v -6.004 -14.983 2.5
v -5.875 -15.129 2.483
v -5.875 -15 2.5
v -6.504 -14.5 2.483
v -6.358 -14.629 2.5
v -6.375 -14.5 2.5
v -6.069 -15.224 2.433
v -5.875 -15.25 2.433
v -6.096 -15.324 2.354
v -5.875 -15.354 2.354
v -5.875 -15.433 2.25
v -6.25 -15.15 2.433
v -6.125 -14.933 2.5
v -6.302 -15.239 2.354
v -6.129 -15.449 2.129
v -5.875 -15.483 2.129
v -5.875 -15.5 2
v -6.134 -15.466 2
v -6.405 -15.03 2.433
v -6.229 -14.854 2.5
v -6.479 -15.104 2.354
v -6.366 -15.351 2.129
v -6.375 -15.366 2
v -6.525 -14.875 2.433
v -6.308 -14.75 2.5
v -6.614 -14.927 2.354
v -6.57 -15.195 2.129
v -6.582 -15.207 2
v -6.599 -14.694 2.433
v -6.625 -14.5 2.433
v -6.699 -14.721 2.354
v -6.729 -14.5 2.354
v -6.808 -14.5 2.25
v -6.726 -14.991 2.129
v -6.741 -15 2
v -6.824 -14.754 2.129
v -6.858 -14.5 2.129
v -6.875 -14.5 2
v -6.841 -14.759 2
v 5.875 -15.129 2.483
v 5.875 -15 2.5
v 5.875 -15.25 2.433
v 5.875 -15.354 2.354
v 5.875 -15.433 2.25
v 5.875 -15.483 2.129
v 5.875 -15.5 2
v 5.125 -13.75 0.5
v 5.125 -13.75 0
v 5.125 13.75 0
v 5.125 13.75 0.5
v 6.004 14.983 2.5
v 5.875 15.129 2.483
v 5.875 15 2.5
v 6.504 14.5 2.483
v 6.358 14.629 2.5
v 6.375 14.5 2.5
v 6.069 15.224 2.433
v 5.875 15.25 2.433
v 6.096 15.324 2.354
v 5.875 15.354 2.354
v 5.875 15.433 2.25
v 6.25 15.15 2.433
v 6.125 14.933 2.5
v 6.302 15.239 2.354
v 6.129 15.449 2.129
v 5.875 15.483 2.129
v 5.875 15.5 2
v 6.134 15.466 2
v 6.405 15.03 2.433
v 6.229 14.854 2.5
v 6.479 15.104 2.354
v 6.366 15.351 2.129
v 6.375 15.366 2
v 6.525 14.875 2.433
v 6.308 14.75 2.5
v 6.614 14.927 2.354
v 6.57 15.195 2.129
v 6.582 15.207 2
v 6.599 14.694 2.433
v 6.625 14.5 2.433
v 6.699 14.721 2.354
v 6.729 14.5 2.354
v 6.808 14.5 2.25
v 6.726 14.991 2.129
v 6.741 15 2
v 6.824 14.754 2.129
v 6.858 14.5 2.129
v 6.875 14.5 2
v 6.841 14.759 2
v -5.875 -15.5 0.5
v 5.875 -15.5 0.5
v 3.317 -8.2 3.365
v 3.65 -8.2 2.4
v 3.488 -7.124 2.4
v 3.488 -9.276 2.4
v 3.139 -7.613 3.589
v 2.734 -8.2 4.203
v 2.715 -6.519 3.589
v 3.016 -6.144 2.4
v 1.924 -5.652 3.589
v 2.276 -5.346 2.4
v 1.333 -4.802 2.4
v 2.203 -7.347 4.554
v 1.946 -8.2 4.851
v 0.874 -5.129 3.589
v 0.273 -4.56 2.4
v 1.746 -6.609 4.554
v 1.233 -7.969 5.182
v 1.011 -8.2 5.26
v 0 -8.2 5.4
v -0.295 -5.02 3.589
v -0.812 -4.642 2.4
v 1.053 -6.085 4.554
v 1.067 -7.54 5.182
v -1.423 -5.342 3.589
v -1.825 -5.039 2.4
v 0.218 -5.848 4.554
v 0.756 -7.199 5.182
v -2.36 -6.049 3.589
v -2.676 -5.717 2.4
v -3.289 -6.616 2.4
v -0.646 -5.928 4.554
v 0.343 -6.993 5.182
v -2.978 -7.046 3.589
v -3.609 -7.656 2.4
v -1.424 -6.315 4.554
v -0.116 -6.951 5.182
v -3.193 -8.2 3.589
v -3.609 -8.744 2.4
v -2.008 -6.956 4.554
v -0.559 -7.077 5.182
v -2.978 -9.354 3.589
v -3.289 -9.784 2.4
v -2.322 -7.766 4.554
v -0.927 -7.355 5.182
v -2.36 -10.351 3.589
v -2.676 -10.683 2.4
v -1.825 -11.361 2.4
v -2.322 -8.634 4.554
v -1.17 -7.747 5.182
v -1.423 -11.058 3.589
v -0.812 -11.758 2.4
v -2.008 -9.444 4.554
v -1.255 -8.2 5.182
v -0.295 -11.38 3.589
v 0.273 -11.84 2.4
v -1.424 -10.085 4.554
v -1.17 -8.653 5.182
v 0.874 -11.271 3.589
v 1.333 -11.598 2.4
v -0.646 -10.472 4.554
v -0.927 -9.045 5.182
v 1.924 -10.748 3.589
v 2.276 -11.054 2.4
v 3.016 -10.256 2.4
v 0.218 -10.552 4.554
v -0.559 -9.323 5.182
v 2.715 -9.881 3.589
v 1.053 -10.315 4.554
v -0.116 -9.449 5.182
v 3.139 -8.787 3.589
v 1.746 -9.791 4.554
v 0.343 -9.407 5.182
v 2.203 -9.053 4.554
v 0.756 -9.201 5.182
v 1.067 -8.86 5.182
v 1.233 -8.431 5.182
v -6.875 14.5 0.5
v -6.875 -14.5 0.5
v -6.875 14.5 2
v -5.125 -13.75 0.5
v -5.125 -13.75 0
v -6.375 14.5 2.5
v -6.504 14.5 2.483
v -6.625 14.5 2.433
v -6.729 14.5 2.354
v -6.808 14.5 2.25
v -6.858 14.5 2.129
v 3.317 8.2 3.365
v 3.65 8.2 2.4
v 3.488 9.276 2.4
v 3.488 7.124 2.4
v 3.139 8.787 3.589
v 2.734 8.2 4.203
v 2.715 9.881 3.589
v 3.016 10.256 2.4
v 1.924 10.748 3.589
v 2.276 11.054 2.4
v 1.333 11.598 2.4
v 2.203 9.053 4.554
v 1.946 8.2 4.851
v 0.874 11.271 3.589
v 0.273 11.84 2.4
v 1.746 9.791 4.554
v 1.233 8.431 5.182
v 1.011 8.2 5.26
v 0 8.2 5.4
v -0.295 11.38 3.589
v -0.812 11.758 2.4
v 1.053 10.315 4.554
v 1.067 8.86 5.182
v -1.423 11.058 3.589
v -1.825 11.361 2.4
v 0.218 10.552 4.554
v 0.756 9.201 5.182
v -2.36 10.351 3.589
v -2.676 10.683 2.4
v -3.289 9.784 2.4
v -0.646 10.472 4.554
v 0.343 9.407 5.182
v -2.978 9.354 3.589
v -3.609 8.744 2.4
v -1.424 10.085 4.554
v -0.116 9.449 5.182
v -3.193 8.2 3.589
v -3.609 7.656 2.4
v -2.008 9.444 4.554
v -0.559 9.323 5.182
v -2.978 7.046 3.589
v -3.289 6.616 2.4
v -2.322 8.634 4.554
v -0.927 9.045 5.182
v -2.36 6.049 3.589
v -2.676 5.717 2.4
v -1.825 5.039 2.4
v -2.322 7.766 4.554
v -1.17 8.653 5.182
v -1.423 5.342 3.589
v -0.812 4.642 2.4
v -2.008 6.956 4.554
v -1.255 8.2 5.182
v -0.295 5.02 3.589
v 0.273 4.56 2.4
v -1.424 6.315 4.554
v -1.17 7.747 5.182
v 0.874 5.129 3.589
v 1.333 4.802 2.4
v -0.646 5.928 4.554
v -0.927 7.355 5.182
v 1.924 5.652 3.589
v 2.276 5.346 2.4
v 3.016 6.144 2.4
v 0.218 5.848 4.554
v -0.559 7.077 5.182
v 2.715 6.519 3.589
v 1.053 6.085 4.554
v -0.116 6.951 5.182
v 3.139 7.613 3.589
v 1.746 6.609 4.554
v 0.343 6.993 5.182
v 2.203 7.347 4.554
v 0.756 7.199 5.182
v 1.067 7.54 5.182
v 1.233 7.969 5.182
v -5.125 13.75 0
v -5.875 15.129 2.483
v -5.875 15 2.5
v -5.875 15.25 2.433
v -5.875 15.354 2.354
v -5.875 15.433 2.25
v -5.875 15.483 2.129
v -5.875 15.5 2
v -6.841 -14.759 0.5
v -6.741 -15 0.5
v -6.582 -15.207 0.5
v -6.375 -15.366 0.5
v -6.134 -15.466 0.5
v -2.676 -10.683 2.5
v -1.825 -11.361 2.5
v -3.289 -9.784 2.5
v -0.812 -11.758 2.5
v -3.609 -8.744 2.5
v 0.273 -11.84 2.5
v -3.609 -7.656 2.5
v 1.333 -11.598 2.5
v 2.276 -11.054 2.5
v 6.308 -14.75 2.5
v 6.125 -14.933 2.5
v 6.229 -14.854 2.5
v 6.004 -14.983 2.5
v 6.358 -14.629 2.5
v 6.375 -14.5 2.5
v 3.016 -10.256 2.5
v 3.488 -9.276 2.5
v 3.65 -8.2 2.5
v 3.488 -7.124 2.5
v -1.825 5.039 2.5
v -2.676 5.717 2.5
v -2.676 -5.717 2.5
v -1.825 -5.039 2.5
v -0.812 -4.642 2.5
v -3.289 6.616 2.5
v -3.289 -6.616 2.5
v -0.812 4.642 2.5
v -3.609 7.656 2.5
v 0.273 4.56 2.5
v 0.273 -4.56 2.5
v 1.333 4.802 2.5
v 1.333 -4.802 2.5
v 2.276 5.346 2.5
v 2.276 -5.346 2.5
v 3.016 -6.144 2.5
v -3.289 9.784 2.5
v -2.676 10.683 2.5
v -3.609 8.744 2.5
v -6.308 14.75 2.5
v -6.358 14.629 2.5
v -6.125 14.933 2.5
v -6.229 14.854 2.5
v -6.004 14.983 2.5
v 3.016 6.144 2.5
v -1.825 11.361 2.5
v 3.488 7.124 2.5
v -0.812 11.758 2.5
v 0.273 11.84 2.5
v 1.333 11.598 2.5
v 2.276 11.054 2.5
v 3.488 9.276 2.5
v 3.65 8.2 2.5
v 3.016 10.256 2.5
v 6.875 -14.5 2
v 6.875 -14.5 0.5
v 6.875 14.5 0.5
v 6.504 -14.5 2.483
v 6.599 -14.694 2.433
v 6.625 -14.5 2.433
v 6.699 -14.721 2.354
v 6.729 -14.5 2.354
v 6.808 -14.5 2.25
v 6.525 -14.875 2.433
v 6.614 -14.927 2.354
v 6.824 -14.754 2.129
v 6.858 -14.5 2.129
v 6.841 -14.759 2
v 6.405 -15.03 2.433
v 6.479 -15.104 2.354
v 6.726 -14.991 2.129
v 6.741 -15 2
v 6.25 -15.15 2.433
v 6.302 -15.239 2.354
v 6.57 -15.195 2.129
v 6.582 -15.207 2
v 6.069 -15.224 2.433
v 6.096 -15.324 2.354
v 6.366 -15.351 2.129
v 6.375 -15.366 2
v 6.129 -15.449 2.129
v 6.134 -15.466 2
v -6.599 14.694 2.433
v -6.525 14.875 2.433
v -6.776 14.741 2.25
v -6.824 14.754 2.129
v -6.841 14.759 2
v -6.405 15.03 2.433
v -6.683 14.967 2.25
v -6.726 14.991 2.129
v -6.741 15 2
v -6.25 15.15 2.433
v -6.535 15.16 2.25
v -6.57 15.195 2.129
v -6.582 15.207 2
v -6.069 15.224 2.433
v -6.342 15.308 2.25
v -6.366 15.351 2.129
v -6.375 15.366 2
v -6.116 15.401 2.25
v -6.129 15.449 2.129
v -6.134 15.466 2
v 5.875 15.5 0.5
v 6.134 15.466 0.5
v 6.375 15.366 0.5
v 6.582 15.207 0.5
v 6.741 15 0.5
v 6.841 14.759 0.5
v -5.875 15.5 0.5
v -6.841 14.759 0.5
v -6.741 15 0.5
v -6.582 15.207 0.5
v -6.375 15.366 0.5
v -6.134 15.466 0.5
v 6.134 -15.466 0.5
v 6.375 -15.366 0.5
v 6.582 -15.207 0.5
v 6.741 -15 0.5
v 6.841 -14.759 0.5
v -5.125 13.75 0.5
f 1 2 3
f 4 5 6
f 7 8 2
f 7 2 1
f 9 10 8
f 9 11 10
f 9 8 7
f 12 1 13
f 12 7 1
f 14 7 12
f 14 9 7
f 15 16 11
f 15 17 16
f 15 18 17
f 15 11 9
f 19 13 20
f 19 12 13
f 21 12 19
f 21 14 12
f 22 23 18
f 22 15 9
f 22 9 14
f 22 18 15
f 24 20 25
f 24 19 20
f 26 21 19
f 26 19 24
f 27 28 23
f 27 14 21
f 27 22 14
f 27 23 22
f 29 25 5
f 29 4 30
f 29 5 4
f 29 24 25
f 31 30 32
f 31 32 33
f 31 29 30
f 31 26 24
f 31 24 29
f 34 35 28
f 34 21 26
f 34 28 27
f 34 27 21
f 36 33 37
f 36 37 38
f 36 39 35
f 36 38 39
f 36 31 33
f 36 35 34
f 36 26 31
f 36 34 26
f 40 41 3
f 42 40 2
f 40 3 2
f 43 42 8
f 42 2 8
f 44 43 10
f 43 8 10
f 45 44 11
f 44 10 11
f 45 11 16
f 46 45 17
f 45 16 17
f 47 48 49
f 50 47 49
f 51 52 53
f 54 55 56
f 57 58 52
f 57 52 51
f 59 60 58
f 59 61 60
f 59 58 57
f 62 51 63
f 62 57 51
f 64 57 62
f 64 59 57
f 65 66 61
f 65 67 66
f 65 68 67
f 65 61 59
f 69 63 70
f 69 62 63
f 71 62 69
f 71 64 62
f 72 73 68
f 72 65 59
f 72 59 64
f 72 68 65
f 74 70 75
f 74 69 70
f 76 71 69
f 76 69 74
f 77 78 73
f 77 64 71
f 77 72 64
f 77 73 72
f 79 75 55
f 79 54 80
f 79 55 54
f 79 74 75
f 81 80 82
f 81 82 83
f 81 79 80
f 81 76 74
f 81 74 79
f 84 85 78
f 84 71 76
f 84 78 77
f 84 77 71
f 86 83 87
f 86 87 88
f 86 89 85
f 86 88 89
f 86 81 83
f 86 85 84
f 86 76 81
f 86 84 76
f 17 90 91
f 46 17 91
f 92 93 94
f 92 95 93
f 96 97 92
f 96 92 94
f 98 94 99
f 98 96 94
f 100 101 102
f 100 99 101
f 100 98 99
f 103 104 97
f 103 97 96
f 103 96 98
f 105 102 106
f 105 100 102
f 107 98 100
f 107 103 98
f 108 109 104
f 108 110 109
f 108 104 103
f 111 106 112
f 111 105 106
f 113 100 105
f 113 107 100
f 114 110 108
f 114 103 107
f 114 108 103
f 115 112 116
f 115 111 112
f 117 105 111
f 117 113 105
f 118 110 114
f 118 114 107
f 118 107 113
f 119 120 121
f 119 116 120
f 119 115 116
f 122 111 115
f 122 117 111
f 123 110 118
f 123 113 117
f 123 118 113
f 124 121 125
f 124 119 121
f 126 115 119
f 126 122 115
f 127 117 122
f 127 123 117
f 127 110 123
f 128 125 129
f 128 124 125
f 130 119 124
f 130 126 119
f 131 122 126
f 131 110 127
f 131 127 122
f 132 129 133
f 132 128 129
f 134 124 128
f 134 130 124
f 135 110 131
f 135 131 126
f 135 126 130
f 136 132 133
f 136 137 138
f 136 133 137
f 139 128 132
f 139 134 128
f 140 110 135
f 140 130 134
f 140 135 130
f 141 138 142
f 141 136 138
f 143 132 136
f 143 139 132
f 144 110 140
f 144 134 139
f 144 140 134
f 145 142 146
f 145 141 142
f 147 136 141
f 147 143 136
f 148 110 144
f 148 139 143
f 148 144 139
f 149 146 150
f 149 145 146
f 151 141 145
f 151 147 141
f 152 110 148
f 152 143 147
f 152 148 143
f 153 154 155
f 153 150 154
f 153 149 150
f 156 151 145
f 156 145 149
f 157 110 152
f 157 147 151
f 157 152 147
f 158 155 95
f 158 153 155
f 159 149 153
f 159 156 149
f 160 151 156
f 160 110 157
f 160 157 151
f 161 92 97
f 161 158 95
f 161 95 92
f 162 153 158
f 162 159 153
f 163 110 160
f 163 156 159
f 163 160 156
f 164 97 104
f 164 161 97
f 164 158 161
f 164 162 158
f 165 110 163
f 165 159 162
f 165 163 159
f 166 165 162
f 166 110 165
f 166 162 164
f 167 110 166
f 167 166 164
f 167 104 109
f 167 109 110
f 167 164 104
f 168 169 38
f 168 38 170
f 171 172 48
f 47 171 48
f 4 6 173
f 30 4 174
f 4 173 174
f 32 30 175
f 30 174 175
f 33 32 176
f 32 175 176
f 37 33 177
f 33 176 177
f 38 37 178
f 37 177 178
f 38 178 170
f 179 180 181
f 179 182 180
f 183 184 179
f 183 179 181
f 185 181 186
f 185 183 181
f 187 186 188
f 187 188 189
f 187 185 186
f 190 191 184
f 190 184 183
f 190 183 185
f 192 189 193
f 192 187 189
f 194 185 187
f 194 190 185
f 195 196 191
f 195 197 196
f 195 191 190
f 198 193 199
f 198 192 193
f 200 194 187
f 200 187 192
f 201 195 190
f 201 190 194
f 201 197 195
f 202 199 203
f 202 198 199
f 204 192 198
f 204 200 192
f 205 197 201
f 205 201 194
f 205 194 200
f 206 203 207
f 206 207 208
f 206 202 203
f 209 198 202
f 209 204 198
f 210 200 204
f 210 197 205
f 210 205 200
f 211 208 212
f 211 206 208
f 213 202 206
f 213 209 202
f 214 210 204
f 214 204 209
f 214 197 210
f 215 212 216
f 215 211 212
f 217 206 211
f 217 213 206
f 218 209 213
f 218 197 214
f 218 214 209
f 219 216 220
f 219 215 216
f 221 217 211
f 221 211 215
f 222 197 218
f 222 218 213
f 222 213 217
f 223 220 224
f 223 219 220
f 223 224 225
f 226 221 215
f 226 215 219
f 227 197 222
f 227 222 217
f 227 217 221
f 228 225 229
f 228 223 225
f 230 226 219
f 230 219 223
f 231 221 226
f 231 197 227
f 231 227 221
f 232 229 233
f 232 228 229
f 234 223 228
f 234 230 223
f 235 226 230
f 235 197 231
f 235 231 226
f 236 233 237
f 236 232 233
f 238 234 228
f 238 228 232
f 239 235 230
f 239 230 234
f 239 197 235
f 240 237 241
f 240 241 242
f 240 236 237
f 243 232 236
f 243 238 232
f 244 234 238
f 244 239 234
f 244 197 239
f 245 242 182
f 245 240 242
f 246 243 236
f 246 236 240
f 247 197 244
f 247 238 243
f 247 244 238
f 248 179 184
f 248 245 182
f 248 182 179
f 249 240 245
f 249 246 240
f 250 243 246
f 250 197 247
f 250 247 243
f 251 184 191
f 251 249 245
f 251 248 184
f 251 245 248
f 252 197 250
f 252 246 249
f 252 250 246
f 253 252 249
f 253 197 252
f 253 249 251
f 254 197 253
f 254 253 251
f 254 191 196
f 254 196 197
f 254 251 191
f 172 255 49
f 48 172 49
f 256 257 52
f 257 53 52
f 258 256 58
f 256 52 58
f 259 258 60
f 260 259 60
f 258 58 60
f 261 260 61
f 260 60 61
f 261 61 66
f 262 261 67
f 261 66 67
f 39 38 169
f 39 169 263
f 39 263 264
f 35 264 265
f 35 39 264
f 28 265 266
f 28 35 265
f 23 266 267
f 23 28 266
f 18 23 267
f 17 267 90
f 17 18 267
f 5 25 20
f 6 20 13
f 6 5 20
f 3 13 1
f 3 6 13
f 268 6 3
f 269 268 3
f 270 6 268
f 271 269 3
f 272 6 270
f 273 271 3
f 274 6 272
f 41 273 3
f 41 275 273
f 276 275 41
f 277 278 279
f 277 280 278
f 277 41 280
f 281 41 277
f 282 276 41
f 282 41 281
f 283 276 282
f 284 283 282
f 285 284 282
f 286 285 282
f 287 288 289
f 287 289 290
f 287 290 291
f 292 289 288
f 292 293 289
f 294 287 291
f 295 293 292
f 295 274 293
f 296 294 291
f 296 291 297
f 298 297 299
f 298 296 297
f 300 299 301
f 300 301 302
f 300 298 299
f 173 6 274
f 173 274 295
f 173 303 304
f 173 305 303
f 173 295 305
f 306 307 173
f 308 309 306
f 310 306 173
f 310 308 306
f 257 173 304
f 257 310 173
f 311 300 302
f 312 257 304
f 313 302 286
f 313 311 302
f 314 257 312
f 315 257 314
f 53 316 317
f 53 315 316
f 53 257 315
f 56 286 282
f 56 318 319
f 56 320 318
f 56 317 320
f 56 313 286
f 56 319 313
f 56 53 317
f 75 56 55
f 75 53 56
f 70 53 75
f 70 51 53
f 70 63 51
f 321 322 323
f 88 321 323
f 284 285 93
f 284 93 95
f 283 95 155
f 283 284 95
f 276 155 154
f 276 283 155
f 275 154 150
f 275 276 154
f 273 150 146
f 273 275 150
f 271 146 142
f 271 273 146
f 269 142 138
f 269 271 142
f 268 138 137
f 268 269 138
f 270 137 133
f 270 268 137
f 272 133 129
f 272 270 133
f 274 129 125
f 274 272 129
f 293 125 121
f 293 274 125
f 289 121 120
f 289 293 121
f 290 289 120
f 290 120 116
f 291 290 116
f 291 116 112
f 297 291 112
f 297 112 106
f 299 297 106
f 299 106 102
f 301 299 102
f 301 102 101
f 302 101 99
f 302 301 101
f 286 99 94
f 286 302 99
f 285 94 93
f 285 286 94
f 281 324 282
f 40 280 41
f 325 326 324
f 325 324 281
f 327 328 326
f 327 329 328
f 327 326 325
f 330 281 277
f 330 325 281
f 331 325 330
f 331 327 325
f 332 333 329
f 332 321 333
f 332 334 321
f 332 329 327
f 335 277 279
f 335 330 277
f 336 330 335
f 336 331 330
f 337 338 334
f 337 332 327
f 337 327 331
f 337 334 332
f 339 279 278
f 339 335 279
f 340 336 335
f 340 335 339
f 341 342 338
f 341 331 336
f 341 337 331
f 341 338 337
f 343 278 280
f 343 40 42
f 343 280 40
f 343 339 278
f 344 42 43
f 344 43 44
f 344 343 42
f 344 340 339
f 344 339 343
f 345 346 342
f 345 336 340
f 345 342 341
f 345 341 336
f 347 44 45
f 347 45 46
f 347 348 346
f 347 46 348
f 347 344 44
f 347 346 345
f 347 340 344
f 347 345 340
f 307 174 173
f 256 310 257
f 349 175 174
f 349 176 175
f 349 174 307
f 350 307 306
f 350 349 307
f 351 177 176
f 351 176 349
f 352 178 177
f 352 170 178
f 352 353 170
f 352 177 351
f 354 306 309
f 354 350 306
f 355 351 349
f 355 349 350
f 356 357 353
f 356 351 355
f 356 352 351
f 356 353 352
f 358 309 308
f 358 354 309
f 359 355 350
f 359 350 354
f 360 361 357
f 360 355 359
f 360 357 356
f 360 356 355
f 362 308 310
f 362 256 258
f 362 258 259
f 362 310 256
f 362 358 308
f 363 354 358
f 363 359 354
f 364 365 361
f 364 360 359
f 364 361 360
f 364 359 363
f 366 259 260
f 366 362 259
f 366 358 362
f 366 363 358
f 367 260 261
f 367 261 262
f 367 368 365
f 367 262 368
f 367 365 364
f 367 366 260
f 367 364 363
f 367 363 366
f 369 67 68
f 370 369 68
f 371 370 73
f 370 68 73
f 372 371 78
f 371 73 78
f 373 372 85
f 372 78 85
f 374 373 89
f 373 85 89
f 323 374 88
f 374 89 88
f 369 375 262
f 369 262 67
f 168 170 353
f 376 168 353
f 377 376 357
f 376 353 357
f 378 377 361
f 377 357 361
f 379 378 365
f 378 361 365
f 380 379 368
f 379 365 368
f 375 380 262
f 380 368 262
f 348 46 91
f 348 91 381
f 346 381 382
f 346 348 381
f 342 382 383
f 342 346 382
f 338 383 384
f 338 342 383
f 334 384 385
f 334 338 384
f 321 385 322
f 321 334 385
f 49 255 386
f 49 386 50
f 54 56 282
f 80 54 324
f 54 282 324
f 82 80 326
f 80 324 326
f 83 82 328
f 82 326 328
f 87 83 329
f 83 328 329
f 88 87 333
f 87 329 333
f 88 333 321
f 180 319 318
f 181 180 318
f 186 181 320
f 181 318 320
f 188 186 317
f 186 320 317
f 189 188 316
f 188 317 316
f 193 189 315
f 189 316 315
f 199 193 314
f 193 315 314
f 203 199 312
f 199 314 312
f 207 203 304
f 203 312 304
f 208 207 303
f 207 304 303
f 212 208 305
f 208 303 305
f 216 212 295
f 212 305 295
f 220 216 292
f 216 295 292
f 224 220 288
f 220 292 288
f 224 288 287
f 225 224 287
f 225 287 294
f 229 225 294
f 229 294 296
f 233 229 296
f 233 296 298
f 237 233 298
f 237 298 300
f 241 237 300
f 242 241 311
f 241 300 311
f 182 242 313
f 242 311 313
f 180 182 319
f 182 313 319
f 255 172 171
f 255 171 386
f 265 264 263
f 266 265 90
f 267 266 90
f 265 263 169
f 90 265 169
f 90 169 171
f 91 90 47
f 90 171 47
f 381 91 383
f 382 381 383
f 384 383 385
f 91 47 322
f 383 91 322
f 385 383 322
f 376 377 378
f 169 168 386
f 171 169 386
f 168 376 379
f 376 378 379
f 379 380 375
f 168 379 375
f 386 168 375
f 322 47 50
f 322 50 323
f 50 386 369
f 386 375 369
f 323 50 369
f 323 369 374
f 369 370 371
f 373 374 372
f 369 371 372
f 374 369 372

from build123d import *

# Parameters (mm, degrees)
SKETCH1_W           = 10.25
SKETCH1_H           = 27.5
BOSS_EXTRUDE1_DEPTH = 0.5
SKETCH2_W           = 13.75
SKETCH2_H           = 31
BOSS_EXTRUDE2_DEPTH = 2
FILLET1_R           = 1
FILLET2_R           = 0.5
SKETCH3_R           = 3.65
CUT_EXTRUDE1_DEPTH  = 0.1


# Read off the part's stored shape, not the designer's step: Dome1, Dome2
with BuildPart() as part:
    # Sketch1 → Boss-Extrude1 (new body)
    with BuildSketch(Plane.XY):
        Rectangle(SKETCH1_W, SKETCH1_H)
    extrude(amount=BOSS_EXTRUDE1_DEPTH)

    # Sketch2 → Boss-Extrude2 (add)
    with BuildSketch(Plane.XY.offset(0.5)):
        Rectangle(SKETCH2_W, SKETCH2_H)
    extrude(amount=BOSS_EXTRUDE2_DEPTH)

    # Fillet1
    fillet1_edges = [part.edges().sort_by_distance(p)[0] for p in [
        (6.875, -15.5, 1.5),
        (6.875, 15.5, 1.5),
        (-6.875, 15.5, 1.5),
        (-6.875, -15.5, 1.5),
    ]]
    fillet(fillet1_edges, radius=FILLET1_R)

    # Fillet2
    fillet2_edges = [part.edges().sort_by_distance(p)[0] for p in [
        (0, 15.5, 2.5),
        (6.875, 0, 2.5),
        (-6.875, 0, 2.5),
        (0, -15.5, 2.5),
        (-6.582106781, 15.207106781, 2.5),
        (-6.582106781, -15.207106781, 2.5),
        (6.582106781, -15.207106781, 2.5),
        (6.582106781, 15.207106781, 2.5),
    ]]
    fillet(fillet2_edges, radius=FILLET2_R)

    # Sketch3 → Cut-Extrude1 (cut)
    with BuildSketch(Plane.XY.offset(2.5)):
        with Locations((0, 8.2)):
            Circle(SKETCH3_R)
    cut_extrude1 = extrude(amount=-CUT_EXTRUDE1_DEPTH, mode=Mode.SUBTRACT)

    # Mirror1: Cut-Extrude1 across plane
    add(cut_extrude1.mirror(Plane.ZX), mode=Mode.SUBTRACT)

    # Dome1 outline → Dome1 (revolve)
    with BuildSketch(Plane.XZ.offset(-8.2)):
        with BuildLine():
            Line((0, 2.4), (3.650000001, 2.399999996))
            ThreePointArc((3.650000001, 2.399999996), (2.362334652, 4.553757157), (0, 5.4))
            Line((0, 5.4), (0, 2.4))
        make_face()
    revolve(axis=Axis((0, 8.2, 0), (0, 0, 1)))

    # Dome2 outline → Dome2 (revolve)
    with BuildSketch(Plane.XZ.offset(8.2)):
        with BuildLine():
            Line((0, 2.4), (3.650000001, 2.399999996))
            ThreePointArc((3.650000001, 2.399999996), (2.362334652, 4.553757157), (0, 5.4))
            Line((0, 5.4), (0, 2.4))
        make_face()
    revolve(axis=Axis((0, -8.2, 0), (0, 0, 1)))


solid = part.part
